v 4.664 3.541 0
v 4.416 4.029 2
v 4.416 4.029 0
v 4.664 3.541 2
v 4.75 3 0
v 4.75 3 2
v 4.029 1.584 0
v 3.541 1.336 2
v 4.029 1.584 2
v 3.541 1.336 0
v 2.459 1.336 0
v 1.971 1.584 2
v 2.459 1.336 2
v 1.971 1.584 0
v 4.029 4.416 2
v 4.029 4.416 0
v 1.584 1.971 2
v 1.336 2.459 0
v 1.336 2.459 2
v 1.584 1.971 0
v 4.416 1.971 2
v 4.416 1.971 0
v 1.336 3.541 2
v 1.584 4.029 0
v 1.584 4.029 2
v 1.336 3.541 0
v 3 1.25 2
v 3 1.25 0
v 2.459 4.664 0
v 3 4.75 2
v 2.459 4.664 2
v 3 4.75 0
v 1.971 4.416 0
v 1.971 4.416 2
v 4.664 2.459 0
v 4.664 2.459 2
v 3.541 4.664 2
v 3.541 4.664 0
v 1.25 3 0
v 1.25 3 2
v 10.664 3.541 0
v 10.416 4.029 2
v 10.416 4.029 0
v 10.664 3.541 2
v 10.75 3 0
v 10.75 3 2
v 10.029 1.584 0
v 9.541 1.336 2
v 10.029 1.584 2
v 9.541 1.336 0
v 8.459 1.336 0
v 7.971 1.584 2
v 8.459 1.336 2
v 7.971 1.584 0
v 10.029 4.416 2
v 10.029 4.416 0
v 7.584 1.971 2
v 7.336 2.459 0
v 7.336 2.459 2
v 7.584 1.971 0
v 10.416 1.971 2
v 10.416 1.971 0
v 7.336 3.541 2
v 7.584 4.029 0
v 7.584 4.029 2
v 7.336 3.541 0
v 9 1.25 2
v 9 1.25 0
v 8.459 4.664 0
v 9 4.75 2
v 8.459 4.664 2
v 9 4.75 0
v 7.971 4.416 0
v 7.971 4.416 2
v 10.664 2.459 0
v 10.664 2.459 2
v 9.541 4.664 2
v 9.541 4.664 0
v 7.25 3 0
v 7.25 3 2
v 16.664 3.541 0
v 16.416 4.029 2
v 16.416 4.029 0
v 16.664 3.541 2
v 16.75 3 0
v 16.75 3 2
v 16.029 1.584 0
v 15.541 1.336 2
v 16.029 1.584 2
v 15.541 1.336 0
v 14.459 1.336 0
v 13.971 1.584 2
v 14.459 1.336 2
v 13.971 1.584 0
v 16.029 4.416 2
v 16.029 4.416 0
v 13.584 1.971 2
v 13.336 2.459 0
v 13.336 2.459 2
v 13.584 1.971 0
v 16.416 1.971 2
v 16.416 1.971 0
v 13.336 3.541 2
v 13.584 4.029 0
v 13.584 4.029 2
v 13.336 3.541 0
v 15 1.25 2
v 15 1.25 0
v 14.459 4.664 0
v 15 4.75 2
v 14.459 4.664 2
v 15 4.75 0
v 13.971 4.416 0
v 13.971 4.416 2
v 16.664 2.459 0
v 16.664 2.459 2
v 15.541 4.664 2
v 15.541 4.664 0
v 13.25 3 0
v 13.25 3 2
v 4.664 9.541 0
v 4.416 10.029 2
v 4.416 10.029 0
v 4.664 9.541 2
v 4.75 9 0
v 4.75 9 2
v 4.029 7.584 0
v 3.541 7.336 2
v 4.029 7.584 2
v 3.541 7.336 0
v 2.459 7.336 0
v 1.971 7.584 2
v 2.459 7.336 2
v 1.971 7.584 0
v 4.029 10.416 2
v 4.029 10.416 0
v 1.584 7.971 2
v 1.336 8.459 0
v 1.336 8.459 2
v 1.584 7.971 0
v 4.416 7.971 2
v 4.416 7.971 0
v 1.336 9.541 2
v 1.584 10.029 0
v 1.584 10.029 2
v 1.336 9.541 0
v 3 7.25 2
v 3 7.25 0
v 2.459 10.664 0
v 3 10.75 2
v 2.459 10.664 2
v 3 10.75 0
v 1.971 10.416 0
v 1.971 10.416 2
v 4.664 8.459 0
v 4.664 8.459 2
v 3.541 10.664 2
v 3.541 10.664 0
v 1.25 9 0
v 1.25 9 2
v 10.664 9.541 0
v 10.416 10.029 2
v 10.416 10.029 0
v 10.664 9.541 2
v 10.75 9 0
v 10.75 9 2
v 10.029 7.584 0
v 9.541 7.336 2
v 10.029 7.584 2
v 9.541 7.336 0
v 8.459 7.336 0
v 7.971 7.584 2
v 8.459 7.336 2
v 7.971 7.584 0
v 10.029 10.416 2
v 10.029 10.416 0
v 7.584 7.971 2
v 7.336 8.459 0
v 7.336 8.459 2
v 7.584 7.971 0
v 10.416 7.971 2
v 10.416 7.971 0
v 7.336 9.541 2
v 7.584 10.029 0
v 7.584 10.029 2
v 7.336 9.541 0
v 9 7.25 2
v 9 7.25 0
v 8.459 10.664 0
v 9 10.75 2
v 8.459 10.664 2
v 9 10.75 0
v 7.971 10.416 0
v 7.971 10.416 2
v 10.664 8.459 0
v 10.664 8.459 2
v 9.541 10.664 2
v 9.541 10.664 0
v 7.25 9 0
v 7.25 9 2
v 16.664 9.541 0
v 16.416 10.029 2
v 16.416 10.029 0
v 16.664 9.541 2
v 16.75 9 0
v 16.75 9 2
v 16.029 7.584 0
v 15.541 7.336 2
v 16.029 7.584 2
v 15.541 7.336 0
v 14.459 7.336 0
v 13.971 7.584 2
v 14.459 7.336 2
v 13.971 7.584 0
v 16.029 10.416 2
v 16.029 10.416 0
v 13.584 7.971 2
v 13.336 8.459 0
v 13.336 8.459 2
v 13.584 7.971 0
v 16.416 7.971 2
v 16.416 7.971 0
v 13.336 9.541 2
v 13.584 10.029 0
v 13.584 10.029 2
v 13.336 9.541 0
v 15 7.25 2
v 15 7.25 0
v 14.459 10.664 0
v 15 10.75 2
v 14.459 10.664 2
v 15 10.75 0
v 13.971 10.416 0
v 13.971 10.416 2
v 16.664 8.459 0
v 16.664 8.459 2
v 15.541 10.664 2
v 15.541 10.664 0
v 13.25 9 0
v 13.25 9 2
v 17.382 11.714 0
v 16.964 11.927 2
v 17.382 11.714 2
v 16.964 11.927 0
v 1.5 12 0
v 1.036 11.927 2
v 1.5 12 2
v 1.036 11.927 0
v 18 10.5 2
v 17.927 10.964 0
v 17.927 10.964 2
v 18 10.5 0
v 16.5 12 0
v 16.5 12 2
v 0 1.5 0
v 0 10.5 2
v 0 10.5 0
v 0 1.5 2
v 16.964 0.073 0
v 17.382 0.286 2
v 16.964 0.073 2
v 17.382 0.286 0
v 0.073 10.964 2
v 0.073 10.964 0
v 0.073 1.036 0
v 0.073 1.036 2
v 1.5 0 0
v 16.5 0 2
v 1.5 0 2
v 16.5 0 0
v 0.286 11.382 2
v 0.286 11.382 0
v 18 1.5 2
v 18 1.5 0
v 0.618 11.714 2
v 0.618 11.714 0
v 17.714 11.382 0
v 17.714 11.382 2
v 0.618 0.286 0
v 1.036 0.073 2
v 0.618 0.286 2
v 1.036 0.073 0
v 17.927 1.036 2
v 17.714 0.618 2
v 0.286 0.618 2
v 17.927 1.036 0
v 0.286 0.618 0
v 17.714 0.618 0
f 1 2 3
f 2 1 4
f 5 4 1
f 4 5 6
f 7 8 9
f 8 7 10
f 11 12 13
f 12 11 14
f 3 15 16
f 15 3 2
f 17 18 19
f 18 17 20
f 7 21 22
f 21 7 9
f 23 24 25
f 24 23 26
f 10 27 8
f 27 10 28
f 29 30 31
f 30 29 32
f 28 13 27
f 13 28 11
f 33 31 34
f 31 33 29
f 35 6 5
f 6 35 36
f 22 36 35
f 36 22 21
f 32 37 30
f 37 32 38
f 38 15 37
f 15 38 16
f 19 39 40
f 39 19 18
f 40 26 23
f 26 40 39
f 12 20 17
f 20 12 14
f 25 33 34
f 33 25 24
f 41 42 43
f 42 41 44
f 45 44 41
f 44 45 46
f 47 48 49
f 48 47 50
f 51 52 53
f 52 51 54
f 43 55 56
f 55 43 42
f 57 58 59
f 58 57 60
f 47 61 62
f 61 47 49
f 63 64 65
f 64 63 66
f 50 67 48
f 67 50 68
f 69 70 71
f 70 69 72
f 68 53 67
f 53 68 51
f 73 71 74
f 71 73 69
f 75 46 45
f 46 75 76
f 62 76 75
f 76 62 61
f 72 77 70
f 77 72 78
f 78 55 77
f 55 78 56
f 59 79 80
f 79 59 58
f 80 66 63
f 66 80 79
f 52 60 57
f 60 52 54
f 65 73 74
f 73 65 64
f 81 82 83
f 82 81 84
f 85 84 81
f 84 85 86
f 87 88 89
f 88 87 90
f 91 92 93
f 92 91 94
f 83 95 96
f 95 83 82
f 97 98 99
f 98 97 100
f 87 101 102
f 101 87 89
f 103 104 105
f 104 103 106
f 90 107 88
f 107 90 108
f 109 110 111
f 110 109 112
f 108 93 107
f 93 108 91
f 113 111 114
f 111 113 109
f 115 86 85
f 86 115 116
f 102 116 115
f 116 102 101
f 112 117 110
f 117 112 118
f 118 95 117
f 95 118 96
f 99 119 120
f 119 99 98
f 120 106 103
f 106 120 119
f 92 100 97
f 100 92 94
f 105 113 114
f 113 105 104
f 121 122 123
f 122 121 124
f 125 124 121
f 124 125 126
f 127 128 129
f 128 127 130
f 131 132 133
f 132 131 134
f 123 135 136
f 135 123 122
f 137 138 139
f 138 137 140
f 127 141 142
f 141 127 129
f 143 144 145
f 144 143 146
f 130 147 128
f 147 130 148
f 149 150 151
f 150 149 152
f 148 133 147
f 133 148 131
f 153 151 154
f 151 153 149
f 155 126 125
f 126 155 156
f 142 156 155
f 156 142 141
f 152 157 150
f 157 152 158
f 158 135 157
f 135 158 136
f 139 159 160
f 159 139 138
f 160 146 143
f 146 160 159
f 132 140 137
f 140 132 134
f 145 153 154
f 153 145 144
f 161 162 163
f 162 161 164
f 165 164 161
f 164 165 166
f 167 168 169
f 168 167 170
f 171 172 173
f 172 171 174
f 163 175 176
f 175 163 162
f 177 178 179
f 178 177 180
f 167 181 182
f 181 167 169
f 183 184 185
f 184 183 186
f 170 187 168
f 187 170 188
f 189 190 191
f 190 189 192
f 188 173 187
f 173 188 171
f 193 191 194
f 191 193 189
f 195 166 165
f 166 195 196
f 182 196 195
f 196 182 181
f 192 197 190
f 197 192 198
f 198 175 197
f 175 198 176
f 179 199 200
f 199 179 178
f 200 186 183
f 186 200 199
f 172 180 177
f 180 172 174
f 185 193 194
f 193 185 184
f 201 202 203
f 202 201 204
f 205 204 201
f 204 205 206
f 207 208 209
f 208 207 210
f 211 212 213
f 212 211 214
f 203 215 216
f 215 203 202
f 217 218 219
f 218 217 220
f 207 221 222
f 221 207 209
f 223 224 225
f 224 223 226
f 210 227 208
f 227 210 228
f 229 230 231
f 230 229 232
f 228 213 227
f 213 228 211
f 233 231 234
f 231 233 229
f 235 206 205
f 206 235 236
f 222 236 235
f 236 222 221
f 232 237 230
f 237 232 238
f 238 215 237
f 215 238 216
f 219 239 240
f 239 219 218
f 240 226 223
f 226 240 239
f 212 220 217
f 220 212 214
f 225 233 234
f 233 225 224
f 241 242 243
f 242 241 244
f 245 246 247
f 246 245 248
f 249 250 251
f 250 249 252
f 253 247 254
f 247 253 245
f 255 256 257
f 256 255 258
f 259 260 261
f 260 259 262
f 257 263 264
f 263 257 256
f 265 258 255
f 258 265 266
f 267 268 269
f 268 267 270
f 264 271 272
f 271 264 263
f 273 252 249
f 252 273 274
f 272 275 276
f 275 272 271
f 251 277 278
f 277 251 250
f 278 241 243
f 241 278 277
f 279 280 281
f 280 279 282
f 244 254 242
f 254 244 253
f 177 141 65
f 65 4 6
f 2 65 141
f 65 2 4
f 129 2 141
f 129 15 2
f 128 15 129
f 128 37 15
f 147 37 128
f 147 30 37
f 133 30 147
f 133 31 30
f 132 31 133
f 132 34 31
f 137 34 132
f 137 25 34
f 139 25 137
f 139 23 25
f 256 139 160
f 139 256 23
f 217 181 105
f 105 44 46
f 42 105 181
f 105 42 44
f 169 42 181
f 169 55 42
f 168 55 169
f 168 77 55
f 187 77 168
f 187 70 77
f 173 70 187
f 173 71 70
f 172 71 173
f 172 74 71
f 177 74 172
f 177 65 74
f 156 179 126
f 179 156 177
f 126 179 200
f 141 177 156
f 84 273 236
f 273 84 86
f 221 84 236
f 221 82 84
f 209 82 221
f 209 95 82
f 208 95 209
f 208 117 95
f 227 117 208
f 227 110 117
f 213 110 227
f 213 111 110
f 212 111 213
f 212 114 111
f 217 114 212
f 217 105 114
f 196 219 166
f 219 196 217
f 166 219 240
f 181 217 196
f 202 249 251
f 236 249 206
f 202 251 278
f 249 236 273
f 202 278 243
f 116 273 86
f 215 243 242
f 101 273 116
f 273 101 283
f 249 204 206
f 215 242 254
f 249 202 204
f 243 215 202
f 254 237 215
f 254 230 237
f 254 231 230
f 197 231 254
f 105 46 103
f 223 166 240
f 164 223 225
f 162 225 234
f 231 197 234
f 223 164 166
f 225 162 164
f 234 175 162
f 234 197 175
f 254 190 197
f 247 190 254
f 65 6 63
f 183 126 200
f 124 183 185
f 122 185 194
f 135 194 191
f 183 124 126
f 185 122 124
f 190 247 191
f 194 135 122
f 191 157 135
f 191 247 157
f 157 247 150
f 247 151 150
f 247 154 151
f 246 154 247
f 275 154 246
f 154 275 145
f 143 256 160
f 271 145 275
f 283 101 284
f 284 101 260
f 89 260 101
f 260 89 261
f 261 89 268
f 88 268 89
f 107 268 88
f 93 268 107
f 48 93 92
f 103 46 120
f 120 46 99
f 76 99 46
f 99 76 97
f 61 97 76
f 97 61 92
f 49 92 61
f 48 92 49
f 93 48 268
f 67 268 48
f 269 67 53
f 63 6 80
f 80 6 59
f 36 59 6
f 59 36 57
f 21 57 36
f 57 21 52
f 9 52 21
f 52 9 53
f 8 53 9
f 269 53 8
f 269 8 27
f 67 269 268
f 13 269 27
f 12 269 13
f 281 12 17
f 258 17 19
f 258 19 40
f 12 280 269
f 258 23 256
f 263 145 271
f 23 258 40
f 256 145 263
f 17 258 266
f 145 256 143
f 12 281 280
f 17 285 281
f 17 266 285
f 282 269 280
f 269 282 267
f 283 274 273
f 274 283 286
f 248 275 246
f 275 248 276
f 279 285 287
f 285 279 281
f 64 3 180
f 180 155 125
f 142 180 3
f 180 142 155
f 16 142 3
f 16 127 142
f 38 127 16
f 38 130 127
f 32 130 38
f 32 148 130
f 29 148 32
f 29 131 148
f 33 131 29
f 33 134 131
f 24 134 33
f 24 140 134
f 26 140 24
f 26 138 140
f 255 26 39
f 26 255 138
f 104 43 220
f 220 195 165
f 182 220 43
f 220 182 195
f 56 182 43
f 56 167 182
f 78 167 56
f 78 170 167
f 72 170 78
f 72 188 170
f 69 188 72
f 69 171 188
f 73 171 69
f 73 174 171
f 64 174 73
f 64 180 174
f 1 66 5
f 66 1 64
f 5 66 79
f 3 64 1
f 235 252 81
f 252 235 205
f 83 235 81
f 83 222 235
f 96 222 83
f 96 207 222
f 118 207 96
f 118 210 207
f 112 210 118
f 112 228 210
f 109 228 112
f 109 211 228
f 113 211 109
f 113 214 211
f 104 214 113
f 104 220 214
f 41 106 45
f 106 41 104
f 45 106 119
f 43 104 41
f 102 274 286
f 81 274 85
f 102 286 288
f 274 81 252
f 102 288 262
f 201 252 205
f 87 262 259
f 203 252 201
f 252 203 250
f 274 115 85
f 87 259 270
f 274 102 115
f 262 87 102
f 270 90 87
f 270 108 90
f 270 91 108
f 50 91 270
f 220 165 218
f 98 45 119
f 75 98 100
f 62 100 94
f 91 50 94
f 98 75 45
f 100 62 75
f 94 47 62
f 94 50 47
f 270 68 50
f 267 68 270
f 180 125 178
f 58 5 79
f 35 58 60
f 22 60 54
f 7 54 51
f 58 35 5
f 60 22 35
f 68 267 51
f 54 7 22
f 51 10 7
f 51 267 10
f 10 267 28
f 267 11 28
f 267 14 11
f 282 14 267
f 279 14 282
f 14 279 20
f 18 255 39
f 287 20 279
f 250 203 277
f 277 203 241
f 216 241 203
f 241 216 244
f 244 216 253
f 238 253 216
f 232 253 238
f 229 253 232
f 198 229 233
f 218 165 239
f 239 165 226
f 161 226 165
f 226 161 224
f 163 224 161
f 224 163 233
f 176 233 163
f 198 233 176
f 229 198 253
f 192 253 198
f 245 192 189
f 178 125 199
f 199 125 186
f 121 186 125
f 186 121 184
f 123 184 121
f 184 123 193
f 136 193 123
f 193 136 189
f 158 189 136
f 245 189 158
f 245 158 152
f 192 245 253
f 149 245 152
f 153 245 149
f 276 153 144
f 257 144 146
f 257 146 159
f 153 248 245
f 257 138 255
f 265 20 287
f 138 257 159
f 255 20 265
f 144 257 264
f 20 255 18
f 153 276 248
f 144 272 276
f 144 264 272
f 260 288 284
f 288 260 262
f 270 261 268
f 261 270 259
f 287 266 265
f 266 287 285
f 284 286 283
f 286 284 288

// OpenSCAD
/*
Nut and Bolt Construction Kit, library and customiser code
By the DoomMeister
v1.0

>>>Parts to be implimented
Rectangle Plate n x n, v1.0
Circular Plate, v1.0
L_beam, v1.0
angle beam, v1.0 (scruffy a<90)
Free Shape Plate -- to follow
Wheel, v1.0
Pully, v1.0
Gears -- to follow
>>>tweakable Parameter
Hole Size
Hole ratio
Clearance
Pulley Cord diameter
>>>>Changes
v1.01, hole size now free entry
*/

//>>>>>>>>>>>>>>>>>>>>>>>>>>>>>>>>>>>>>>>>>>>>>>>>>>>>>>>>>>>>>>>
//Customiser Code
//For Library use comment this and the section bellow out
//>>>>>>>>>>>>>>>>>>>>>>>>>>>>>>>>>>>>>>>>>>>>>>>>>>>>>>>>>>>>>>>
///*
							//shape of part	
							shape = "plate";	// [plate,L_plate,angle_plate,round_plate,wheel,pully]
							//holes across, also used to determine size of round plate and gear
							x_holes=3;				//	
							//holes in the up down direction
							y_holes= 2;				//
							//holes on L plate side
							z_holes = 2;			//
							//of angle beam, or between holes on circle
							angle = 120;				// 
							//thickness of part
							thickness = 2;			//
							//size of screws and rod used
							screw_diameter = 3;	//
							//tweak,distance between holes in diameters
							hole_ratio = 1;		//
							//cord diameter for pullys
							cord_diameter = 1.5;  //
							//tweak, clearance on holes
							clearance = 0.5;		//[0.1:1]
							//tweak, round or square corners
							round_corners = "yes";	//[yes,no]
							//tweak, corner quality, nuber of facets
							quality = 20;  		//[10,25,50,100]
							
//>>>>>>>>>>>>>>>>>>>>>>>>>>>>>>>>>>>>>>>>>>>>>>>>>>>>>>>>>>>>>>>
//Test Section, draws the part. 
//For Library use follow this structure in your own code
//>>>>>>>>>>>>>>>>>>>>>>>>>>>>>>>>>>>>>>>>>>>>>>>>>>>>>>>>>>>>>>>
construction_set_part(		_shape = shape, 
							nx = x_holes, 
							ny = y_holes, 
							nz = z_holes,
							ang = angle,
							hd = screw_diameter,
							hr = hole_ratio,
							thk = thickness, 
							clr = clearance,
							corners = round_corners,
							qul = quality,
							crdd = cord_diameter);

//*/ 
//>>>>>>>>>>>>>>>>>>>>>>>>>>>>>>>>>>>>>>>>>>>>>>>>>>>>>>>>>>>>>>>
//Outer Module, does the selection work
//>>>>>>>>>>>>>>>>>>>>>>>>>>>>>>>>>>>>>>>>>>>>>>>>>>>>>>>>>>>>>>>
module construction_set_part(_shape = "rectangle", nx = 4, ny = 2,nz= 0, ang = 90, hd = 3,hr = 2,thk = 2,clr = 0.5, corners = "yes", crdd, qul = 10)
{
	echo(_shape,nx,ny,nz);
	if	(_shape=="plate")
		{
			color("red")
			plate_rectangle(_nx = nx, _ny = ny,_nz = 0, _hd = hd, _hr = hr,_thk = thk,_clr = clr, _corners=corners, _qul = qul);
		}
	if	(_shape=="L_plate")
		{
			color("green")
			plate_rectangle(_nx = nx, _ny = ny,_nz = nz,_ang=90, _hd = hd, _hr = hr,_thk = thk,_clr = clr, _corners=corners, _qul = qul);
		}
	if	(_shape=="angle_plate")
		{
			plate_angle(_nx = nx, _ny = ny,_nz = nz,_ang=ang, _hd = hd, _hr = hr,_thk = thk,_clr = clr, _corners=corners, _qul = qul);
		}
	if	(_shape=="round_plate")
		{
			color("blue")
			plate_round(_nx = nx, _ny = ny,_nz = nz,_ang = ang, _hd = hd, _hr = hr,_thk = thk,_clr = clr, _corners=corners, _qul = qul);
		}
	if	(_shape=="wheel")
		{
			color("purple")
			wheel(_nx = nx, _ny = ny,_nz = nz,_ang = ang, _hd = hd, _hr = hr,_thk = thk,_clr = clr, _corners=corners,_pully = false, _crrd=0, _qul = qul);
		}
	if	(_shape=="pully")
		{
			color("pink")
			wheel(_nx = nx, _ny = ny,_nz = nz,_ang = ang, _hd = hd, _hr = hr,_thk = thk,_clr = clr, _corners=corners,_pully = true, 				_crdd=crdd, _qul = qul);
		}
}

//>>>>>>>>>>>>>>>>>>>>>>>>>>>>>>>>>>>>>>>>>>>>>>>>>>>>>>>>>>>>>>>
//Inner Modules, draws the parts
//>>>>>>>>>>>>>>>>>>>>>>>>>>>>>>>>>>>>>>>>>>>>>>>>>>>>>>>>>>>>>>>

module plate_rectangle(_nx = 4, _ny = 1,_nz=0,_ang=90, _hd = 3, _hr = 2,_thk = 2,_clr = 0.5, _corners="yes", _qul = 10)
{
//module to draw flat plates and L beams.
_wi = _hd * (_hr+1);
_w = _wi * _nx;
_h = _wi * _ny;
_z = (_wi * _nz)+(_thk*(_nz/_nz));
echo("build area required(x\y\z)",_w,_h,_z);

union()
	{
		_plate_rectangle(__nx = _nx, __ny = _ny, __hd = _hd, __hr = _hr,__thk = _thk,__clr = _clr, __corners=_corners, __qul = _qul);
		if(_nz>0)
			{
				translate([0,0,_thk])
				rotate([90,0,0])
					_plate_rectangle(__nx = _nx, __ny = _nz, __hd = _hd, __hr = _hr,__thk = _thk,__clr = _clr, __corners=_corners, __qul = _qul);
				translate([0,-_thk,0])
					cube([_w,_thk,_thk]);
				translate([0,-_thk,0])
					cube([_thk,_thk+_hd/2,_thk]);
				translate([0,-_thk,0])
					cube([_thk,_thk,_thk+_hd/2]);
				translate([_w-_thk,-_thk,0])
					cube([_thk,_thk+_hd/2,_thk]);
				translate([_w-_thk,-_thk,0])
					cube([_thk,_thk,_thk+_hd/2]);
			}

	}

}

module plate_angle(_nx = 4, _ny = 1,_nz=0,_ang=90, _hd = 3, _hr = 2,_thk = 2,_clr = 0.5, _corners="yes", _qul = 10)
{
//module to draw flat plates and L beams.
_wi = _hd * (_hr+1);
_w = _wi * _nz;
_h = _wi * _ny;
_z = (_wi * _nz)+(_thk*(_nz/_nz));
_xl = _thk*tan(90-_ang/2);
_xm = (_thk*sin(_ang/2));
_xn = _thk*cos(_ang/2);
echo("build area required(x\y\z)",_w,_h,_z,_xl);

union()
	{
		
		rotate([0,270,-_ang/2])
		translate([0,0,-_thk])
			_plate_rectangle(__nx = _nz, __ny = _nx, __hd = _hd, __hr = _hr,__thk = _thk,__clr = _clr, __corners=_corners, __qul = _qul);
		translate([0,0,0])
		rotate([0,270,_ang/2])
			_plate_rectangle(__nx = _nz, __ny = _ny, __hd = _hd, __hr = _hr,__thk = _thk,__clr = _clr, __corners=_corners, __qul = _qul);
	if(_ang>90)
		{
		rotate([0,270,-_ang/2])
		translate([0,-_xl,-_thk])
			cube([_w,_hd/2+_xl,_thk]);
		rotate([0,270,_ang/2])
		translate([0,-_xl,0])
			cube([_w,_hd/2+_xl,_thk]);
		}

	if(_ang<90)
		{
			translate([-_xn,-_xm,0])
				cube([(_xn)*2,_xm,_w]);
			
			cylinder(r=(_wi-_hd)/3, h=_w, $fn=_qul);
		}

	}

}


module plate_round(_nx = 4, _ny = 1,_nz=0,_ang = 90, _hd = 3, _hr = 2,_thk = 2,_clr = 0.5, _corners="yes", _qul = 10)
{
//module to make round plate with n holes at specified angle
_wi = _hd * (_hr+1);
_w = _wi * _nx;
_h = _wi * _ny;
_eff_d = _w-(_hd*2);
_c = 3.142 *_eff_d;
_nh = 360 / _ang;
_ha = 360/_nh;

echo("Build area (xyz)", _w,_w,_eff_d,_nh,_c);

difference()
	{
	cylinder(r=_w/2, h=_thk, $fn=_qul);
	for(nh = [0:_nh-1])
		{
			for( ri = [0:round(_nx/2)])
			{
			rotate([0,0,nh*_ha])
			translate([ri*_wi,0,-1])
				cylinder(r=(_hd+_clr)/2, h = _thk+2, $fn=_qul);
			}

		}
			/*translate([0,0,-1])
				cylinder(r=(_hd+_clr)/2, h = _thk+2, $fn=_qul);*/
	}
}


module wheel(_nx = 4, _ny = 1,_nz=0,_ang = 90, _hd = 3, _hr = 2,_thk = 2,_clr = 0.5, _corners="yes",_pully=false,_crdd=1, _qul = 10)
{
//module to make wheels and pulleys
_wi = _hd * (_hr+1);
_w = _wi * _nx;
_cr = _thk*1;


echo("Build area (xyz)", _w+(2*_cr),_w+(2*_cr),2*_cr);

difference()
	{
		union()
		{
			translate([0,0,-_cr])
			cylinder(r=_w/2, h=_thk, $fn=_qul);
			translate([0,0,-_cr])
			cylinder(r=(_hd+_clr), h = _thk +_cr, $fn=_qul);
			rotate_extrude(convexity = 10)
			translate([_w/2,0,_cr])
			//rotate([90,0,0])
				circle(r = _cr, $fn=_qul);

		}
			if(_pully)
				{
					rotate_extrude(convexity = 10)
					translate([(_w+_cr)/2,0,_cr])
						circle(r = (_crdd)/2, $fn=_qul);
					rotate_extrude(convexity = 10)
					translate([(_w+_cr)/2,-_crdd/2,0])
						square([_crdd+_cr,_crdd]);
				}

			translate([0,0,-_cr-1])
				cylinder(r=(_hd+_clr)/2, h = _thk+2+_cr, $fn=_qul);
	}
}

//>>>>>>>>>>>>>>>>>>>>>>>>>>>>>>>>>>>>>>>>>>>>>>>>>>>>>>>>>>>>>>>
//Support Modules, draws bits of the parts
//>>>>>>>>>>>>>>>>>>>>>>>>>>>>>>>>>>>>>>>>>>>>>>>>>>>>>>>>>>>>>>>
module hole(_id = 3, _od = 6,__thk = 2,__qul = 10)
{
_ir = _id/2;
_or = _od/2;

	difference()
	{
		cylinder(r = _or, h=__thk, $fn = __qul);
		translate([0,0,-1])
			cylinder(r = _ir, h=__thk+2, $fn = __qul);
	}
}

module _plate_rectangle(__nx = 4, __ny = 1, __hd = 3, __hr = 2,__thk = 2,__clr = 0.5, __corners="yes", __qul = 10)
{
//module to draw flat plates and L beams.
__wi = __hd * (__hr+1);
__w = __wi * __nx;
__h = __wi * __ny;

	difference()
	{	
		if (__corners=="yes")
		{
			union()
			{
				minkowski()
				{
					cube([__w-__hd,__h-__hd,__thk/2]);
					translate([__hd/2,__hd/2,0])
						cylinder(r = __hd/2, h = __thk/2, $fn = __qul);
				}}



		}
		if (__corners=="no")
		{
			union()
			{
				cube([__w,__h,__thk]);

			}
		}
		for
			( y = [0:__ny-1])
			{
			for( x = [0:__nx-1])
			{
				#translate([__wi/2+(x*__wi),__wi/2+(y*__wi),-1])
					cylinder(r = (__hd + __clr)/2, h = __thk + 2, $fn = __qul);
			}}
	}

}

//>>>>>>>>>>>>>>>>>>>>>>>>>>>>>>>>>>>>>>>>>>>>>>>>>>>>>>>>>>>>>>>
//Dev Modules, not working yet
//>>>>>>>>>>>>>>>>>>>>>>>>>>>>>>>>>>>>>>>>>>>>>>>>>>>>>>>>>>>>>>>
module plate_free(_nx = 4, _ny = 1,_nz=0, _hd = 3, _hr = 2,_thk = 2,_clr = 0.5, _corners="yes", _qul = 10)
{
//atempt to build a plate of any rows
_wi = _hd * (_hr+1);
_w = _wi * _nx;
_h = _wi * _ny;
_z = (_wi * _nz)+(_thk*(_nz/_nz));
echo("build area required(x\y\z)");

		union(){
		for(yi= [0:4-1])
		{
			for(xi = [1,3,4,2,3,4,2])
			{
			for(i= [	[_wi*xi,_wi*yi],
					
					])
			{
				translate(i)
						hole(_id=_hd+_clr, _od=_wi, __thk = _thk, __qul = _qul);
			}}}
		}
}
